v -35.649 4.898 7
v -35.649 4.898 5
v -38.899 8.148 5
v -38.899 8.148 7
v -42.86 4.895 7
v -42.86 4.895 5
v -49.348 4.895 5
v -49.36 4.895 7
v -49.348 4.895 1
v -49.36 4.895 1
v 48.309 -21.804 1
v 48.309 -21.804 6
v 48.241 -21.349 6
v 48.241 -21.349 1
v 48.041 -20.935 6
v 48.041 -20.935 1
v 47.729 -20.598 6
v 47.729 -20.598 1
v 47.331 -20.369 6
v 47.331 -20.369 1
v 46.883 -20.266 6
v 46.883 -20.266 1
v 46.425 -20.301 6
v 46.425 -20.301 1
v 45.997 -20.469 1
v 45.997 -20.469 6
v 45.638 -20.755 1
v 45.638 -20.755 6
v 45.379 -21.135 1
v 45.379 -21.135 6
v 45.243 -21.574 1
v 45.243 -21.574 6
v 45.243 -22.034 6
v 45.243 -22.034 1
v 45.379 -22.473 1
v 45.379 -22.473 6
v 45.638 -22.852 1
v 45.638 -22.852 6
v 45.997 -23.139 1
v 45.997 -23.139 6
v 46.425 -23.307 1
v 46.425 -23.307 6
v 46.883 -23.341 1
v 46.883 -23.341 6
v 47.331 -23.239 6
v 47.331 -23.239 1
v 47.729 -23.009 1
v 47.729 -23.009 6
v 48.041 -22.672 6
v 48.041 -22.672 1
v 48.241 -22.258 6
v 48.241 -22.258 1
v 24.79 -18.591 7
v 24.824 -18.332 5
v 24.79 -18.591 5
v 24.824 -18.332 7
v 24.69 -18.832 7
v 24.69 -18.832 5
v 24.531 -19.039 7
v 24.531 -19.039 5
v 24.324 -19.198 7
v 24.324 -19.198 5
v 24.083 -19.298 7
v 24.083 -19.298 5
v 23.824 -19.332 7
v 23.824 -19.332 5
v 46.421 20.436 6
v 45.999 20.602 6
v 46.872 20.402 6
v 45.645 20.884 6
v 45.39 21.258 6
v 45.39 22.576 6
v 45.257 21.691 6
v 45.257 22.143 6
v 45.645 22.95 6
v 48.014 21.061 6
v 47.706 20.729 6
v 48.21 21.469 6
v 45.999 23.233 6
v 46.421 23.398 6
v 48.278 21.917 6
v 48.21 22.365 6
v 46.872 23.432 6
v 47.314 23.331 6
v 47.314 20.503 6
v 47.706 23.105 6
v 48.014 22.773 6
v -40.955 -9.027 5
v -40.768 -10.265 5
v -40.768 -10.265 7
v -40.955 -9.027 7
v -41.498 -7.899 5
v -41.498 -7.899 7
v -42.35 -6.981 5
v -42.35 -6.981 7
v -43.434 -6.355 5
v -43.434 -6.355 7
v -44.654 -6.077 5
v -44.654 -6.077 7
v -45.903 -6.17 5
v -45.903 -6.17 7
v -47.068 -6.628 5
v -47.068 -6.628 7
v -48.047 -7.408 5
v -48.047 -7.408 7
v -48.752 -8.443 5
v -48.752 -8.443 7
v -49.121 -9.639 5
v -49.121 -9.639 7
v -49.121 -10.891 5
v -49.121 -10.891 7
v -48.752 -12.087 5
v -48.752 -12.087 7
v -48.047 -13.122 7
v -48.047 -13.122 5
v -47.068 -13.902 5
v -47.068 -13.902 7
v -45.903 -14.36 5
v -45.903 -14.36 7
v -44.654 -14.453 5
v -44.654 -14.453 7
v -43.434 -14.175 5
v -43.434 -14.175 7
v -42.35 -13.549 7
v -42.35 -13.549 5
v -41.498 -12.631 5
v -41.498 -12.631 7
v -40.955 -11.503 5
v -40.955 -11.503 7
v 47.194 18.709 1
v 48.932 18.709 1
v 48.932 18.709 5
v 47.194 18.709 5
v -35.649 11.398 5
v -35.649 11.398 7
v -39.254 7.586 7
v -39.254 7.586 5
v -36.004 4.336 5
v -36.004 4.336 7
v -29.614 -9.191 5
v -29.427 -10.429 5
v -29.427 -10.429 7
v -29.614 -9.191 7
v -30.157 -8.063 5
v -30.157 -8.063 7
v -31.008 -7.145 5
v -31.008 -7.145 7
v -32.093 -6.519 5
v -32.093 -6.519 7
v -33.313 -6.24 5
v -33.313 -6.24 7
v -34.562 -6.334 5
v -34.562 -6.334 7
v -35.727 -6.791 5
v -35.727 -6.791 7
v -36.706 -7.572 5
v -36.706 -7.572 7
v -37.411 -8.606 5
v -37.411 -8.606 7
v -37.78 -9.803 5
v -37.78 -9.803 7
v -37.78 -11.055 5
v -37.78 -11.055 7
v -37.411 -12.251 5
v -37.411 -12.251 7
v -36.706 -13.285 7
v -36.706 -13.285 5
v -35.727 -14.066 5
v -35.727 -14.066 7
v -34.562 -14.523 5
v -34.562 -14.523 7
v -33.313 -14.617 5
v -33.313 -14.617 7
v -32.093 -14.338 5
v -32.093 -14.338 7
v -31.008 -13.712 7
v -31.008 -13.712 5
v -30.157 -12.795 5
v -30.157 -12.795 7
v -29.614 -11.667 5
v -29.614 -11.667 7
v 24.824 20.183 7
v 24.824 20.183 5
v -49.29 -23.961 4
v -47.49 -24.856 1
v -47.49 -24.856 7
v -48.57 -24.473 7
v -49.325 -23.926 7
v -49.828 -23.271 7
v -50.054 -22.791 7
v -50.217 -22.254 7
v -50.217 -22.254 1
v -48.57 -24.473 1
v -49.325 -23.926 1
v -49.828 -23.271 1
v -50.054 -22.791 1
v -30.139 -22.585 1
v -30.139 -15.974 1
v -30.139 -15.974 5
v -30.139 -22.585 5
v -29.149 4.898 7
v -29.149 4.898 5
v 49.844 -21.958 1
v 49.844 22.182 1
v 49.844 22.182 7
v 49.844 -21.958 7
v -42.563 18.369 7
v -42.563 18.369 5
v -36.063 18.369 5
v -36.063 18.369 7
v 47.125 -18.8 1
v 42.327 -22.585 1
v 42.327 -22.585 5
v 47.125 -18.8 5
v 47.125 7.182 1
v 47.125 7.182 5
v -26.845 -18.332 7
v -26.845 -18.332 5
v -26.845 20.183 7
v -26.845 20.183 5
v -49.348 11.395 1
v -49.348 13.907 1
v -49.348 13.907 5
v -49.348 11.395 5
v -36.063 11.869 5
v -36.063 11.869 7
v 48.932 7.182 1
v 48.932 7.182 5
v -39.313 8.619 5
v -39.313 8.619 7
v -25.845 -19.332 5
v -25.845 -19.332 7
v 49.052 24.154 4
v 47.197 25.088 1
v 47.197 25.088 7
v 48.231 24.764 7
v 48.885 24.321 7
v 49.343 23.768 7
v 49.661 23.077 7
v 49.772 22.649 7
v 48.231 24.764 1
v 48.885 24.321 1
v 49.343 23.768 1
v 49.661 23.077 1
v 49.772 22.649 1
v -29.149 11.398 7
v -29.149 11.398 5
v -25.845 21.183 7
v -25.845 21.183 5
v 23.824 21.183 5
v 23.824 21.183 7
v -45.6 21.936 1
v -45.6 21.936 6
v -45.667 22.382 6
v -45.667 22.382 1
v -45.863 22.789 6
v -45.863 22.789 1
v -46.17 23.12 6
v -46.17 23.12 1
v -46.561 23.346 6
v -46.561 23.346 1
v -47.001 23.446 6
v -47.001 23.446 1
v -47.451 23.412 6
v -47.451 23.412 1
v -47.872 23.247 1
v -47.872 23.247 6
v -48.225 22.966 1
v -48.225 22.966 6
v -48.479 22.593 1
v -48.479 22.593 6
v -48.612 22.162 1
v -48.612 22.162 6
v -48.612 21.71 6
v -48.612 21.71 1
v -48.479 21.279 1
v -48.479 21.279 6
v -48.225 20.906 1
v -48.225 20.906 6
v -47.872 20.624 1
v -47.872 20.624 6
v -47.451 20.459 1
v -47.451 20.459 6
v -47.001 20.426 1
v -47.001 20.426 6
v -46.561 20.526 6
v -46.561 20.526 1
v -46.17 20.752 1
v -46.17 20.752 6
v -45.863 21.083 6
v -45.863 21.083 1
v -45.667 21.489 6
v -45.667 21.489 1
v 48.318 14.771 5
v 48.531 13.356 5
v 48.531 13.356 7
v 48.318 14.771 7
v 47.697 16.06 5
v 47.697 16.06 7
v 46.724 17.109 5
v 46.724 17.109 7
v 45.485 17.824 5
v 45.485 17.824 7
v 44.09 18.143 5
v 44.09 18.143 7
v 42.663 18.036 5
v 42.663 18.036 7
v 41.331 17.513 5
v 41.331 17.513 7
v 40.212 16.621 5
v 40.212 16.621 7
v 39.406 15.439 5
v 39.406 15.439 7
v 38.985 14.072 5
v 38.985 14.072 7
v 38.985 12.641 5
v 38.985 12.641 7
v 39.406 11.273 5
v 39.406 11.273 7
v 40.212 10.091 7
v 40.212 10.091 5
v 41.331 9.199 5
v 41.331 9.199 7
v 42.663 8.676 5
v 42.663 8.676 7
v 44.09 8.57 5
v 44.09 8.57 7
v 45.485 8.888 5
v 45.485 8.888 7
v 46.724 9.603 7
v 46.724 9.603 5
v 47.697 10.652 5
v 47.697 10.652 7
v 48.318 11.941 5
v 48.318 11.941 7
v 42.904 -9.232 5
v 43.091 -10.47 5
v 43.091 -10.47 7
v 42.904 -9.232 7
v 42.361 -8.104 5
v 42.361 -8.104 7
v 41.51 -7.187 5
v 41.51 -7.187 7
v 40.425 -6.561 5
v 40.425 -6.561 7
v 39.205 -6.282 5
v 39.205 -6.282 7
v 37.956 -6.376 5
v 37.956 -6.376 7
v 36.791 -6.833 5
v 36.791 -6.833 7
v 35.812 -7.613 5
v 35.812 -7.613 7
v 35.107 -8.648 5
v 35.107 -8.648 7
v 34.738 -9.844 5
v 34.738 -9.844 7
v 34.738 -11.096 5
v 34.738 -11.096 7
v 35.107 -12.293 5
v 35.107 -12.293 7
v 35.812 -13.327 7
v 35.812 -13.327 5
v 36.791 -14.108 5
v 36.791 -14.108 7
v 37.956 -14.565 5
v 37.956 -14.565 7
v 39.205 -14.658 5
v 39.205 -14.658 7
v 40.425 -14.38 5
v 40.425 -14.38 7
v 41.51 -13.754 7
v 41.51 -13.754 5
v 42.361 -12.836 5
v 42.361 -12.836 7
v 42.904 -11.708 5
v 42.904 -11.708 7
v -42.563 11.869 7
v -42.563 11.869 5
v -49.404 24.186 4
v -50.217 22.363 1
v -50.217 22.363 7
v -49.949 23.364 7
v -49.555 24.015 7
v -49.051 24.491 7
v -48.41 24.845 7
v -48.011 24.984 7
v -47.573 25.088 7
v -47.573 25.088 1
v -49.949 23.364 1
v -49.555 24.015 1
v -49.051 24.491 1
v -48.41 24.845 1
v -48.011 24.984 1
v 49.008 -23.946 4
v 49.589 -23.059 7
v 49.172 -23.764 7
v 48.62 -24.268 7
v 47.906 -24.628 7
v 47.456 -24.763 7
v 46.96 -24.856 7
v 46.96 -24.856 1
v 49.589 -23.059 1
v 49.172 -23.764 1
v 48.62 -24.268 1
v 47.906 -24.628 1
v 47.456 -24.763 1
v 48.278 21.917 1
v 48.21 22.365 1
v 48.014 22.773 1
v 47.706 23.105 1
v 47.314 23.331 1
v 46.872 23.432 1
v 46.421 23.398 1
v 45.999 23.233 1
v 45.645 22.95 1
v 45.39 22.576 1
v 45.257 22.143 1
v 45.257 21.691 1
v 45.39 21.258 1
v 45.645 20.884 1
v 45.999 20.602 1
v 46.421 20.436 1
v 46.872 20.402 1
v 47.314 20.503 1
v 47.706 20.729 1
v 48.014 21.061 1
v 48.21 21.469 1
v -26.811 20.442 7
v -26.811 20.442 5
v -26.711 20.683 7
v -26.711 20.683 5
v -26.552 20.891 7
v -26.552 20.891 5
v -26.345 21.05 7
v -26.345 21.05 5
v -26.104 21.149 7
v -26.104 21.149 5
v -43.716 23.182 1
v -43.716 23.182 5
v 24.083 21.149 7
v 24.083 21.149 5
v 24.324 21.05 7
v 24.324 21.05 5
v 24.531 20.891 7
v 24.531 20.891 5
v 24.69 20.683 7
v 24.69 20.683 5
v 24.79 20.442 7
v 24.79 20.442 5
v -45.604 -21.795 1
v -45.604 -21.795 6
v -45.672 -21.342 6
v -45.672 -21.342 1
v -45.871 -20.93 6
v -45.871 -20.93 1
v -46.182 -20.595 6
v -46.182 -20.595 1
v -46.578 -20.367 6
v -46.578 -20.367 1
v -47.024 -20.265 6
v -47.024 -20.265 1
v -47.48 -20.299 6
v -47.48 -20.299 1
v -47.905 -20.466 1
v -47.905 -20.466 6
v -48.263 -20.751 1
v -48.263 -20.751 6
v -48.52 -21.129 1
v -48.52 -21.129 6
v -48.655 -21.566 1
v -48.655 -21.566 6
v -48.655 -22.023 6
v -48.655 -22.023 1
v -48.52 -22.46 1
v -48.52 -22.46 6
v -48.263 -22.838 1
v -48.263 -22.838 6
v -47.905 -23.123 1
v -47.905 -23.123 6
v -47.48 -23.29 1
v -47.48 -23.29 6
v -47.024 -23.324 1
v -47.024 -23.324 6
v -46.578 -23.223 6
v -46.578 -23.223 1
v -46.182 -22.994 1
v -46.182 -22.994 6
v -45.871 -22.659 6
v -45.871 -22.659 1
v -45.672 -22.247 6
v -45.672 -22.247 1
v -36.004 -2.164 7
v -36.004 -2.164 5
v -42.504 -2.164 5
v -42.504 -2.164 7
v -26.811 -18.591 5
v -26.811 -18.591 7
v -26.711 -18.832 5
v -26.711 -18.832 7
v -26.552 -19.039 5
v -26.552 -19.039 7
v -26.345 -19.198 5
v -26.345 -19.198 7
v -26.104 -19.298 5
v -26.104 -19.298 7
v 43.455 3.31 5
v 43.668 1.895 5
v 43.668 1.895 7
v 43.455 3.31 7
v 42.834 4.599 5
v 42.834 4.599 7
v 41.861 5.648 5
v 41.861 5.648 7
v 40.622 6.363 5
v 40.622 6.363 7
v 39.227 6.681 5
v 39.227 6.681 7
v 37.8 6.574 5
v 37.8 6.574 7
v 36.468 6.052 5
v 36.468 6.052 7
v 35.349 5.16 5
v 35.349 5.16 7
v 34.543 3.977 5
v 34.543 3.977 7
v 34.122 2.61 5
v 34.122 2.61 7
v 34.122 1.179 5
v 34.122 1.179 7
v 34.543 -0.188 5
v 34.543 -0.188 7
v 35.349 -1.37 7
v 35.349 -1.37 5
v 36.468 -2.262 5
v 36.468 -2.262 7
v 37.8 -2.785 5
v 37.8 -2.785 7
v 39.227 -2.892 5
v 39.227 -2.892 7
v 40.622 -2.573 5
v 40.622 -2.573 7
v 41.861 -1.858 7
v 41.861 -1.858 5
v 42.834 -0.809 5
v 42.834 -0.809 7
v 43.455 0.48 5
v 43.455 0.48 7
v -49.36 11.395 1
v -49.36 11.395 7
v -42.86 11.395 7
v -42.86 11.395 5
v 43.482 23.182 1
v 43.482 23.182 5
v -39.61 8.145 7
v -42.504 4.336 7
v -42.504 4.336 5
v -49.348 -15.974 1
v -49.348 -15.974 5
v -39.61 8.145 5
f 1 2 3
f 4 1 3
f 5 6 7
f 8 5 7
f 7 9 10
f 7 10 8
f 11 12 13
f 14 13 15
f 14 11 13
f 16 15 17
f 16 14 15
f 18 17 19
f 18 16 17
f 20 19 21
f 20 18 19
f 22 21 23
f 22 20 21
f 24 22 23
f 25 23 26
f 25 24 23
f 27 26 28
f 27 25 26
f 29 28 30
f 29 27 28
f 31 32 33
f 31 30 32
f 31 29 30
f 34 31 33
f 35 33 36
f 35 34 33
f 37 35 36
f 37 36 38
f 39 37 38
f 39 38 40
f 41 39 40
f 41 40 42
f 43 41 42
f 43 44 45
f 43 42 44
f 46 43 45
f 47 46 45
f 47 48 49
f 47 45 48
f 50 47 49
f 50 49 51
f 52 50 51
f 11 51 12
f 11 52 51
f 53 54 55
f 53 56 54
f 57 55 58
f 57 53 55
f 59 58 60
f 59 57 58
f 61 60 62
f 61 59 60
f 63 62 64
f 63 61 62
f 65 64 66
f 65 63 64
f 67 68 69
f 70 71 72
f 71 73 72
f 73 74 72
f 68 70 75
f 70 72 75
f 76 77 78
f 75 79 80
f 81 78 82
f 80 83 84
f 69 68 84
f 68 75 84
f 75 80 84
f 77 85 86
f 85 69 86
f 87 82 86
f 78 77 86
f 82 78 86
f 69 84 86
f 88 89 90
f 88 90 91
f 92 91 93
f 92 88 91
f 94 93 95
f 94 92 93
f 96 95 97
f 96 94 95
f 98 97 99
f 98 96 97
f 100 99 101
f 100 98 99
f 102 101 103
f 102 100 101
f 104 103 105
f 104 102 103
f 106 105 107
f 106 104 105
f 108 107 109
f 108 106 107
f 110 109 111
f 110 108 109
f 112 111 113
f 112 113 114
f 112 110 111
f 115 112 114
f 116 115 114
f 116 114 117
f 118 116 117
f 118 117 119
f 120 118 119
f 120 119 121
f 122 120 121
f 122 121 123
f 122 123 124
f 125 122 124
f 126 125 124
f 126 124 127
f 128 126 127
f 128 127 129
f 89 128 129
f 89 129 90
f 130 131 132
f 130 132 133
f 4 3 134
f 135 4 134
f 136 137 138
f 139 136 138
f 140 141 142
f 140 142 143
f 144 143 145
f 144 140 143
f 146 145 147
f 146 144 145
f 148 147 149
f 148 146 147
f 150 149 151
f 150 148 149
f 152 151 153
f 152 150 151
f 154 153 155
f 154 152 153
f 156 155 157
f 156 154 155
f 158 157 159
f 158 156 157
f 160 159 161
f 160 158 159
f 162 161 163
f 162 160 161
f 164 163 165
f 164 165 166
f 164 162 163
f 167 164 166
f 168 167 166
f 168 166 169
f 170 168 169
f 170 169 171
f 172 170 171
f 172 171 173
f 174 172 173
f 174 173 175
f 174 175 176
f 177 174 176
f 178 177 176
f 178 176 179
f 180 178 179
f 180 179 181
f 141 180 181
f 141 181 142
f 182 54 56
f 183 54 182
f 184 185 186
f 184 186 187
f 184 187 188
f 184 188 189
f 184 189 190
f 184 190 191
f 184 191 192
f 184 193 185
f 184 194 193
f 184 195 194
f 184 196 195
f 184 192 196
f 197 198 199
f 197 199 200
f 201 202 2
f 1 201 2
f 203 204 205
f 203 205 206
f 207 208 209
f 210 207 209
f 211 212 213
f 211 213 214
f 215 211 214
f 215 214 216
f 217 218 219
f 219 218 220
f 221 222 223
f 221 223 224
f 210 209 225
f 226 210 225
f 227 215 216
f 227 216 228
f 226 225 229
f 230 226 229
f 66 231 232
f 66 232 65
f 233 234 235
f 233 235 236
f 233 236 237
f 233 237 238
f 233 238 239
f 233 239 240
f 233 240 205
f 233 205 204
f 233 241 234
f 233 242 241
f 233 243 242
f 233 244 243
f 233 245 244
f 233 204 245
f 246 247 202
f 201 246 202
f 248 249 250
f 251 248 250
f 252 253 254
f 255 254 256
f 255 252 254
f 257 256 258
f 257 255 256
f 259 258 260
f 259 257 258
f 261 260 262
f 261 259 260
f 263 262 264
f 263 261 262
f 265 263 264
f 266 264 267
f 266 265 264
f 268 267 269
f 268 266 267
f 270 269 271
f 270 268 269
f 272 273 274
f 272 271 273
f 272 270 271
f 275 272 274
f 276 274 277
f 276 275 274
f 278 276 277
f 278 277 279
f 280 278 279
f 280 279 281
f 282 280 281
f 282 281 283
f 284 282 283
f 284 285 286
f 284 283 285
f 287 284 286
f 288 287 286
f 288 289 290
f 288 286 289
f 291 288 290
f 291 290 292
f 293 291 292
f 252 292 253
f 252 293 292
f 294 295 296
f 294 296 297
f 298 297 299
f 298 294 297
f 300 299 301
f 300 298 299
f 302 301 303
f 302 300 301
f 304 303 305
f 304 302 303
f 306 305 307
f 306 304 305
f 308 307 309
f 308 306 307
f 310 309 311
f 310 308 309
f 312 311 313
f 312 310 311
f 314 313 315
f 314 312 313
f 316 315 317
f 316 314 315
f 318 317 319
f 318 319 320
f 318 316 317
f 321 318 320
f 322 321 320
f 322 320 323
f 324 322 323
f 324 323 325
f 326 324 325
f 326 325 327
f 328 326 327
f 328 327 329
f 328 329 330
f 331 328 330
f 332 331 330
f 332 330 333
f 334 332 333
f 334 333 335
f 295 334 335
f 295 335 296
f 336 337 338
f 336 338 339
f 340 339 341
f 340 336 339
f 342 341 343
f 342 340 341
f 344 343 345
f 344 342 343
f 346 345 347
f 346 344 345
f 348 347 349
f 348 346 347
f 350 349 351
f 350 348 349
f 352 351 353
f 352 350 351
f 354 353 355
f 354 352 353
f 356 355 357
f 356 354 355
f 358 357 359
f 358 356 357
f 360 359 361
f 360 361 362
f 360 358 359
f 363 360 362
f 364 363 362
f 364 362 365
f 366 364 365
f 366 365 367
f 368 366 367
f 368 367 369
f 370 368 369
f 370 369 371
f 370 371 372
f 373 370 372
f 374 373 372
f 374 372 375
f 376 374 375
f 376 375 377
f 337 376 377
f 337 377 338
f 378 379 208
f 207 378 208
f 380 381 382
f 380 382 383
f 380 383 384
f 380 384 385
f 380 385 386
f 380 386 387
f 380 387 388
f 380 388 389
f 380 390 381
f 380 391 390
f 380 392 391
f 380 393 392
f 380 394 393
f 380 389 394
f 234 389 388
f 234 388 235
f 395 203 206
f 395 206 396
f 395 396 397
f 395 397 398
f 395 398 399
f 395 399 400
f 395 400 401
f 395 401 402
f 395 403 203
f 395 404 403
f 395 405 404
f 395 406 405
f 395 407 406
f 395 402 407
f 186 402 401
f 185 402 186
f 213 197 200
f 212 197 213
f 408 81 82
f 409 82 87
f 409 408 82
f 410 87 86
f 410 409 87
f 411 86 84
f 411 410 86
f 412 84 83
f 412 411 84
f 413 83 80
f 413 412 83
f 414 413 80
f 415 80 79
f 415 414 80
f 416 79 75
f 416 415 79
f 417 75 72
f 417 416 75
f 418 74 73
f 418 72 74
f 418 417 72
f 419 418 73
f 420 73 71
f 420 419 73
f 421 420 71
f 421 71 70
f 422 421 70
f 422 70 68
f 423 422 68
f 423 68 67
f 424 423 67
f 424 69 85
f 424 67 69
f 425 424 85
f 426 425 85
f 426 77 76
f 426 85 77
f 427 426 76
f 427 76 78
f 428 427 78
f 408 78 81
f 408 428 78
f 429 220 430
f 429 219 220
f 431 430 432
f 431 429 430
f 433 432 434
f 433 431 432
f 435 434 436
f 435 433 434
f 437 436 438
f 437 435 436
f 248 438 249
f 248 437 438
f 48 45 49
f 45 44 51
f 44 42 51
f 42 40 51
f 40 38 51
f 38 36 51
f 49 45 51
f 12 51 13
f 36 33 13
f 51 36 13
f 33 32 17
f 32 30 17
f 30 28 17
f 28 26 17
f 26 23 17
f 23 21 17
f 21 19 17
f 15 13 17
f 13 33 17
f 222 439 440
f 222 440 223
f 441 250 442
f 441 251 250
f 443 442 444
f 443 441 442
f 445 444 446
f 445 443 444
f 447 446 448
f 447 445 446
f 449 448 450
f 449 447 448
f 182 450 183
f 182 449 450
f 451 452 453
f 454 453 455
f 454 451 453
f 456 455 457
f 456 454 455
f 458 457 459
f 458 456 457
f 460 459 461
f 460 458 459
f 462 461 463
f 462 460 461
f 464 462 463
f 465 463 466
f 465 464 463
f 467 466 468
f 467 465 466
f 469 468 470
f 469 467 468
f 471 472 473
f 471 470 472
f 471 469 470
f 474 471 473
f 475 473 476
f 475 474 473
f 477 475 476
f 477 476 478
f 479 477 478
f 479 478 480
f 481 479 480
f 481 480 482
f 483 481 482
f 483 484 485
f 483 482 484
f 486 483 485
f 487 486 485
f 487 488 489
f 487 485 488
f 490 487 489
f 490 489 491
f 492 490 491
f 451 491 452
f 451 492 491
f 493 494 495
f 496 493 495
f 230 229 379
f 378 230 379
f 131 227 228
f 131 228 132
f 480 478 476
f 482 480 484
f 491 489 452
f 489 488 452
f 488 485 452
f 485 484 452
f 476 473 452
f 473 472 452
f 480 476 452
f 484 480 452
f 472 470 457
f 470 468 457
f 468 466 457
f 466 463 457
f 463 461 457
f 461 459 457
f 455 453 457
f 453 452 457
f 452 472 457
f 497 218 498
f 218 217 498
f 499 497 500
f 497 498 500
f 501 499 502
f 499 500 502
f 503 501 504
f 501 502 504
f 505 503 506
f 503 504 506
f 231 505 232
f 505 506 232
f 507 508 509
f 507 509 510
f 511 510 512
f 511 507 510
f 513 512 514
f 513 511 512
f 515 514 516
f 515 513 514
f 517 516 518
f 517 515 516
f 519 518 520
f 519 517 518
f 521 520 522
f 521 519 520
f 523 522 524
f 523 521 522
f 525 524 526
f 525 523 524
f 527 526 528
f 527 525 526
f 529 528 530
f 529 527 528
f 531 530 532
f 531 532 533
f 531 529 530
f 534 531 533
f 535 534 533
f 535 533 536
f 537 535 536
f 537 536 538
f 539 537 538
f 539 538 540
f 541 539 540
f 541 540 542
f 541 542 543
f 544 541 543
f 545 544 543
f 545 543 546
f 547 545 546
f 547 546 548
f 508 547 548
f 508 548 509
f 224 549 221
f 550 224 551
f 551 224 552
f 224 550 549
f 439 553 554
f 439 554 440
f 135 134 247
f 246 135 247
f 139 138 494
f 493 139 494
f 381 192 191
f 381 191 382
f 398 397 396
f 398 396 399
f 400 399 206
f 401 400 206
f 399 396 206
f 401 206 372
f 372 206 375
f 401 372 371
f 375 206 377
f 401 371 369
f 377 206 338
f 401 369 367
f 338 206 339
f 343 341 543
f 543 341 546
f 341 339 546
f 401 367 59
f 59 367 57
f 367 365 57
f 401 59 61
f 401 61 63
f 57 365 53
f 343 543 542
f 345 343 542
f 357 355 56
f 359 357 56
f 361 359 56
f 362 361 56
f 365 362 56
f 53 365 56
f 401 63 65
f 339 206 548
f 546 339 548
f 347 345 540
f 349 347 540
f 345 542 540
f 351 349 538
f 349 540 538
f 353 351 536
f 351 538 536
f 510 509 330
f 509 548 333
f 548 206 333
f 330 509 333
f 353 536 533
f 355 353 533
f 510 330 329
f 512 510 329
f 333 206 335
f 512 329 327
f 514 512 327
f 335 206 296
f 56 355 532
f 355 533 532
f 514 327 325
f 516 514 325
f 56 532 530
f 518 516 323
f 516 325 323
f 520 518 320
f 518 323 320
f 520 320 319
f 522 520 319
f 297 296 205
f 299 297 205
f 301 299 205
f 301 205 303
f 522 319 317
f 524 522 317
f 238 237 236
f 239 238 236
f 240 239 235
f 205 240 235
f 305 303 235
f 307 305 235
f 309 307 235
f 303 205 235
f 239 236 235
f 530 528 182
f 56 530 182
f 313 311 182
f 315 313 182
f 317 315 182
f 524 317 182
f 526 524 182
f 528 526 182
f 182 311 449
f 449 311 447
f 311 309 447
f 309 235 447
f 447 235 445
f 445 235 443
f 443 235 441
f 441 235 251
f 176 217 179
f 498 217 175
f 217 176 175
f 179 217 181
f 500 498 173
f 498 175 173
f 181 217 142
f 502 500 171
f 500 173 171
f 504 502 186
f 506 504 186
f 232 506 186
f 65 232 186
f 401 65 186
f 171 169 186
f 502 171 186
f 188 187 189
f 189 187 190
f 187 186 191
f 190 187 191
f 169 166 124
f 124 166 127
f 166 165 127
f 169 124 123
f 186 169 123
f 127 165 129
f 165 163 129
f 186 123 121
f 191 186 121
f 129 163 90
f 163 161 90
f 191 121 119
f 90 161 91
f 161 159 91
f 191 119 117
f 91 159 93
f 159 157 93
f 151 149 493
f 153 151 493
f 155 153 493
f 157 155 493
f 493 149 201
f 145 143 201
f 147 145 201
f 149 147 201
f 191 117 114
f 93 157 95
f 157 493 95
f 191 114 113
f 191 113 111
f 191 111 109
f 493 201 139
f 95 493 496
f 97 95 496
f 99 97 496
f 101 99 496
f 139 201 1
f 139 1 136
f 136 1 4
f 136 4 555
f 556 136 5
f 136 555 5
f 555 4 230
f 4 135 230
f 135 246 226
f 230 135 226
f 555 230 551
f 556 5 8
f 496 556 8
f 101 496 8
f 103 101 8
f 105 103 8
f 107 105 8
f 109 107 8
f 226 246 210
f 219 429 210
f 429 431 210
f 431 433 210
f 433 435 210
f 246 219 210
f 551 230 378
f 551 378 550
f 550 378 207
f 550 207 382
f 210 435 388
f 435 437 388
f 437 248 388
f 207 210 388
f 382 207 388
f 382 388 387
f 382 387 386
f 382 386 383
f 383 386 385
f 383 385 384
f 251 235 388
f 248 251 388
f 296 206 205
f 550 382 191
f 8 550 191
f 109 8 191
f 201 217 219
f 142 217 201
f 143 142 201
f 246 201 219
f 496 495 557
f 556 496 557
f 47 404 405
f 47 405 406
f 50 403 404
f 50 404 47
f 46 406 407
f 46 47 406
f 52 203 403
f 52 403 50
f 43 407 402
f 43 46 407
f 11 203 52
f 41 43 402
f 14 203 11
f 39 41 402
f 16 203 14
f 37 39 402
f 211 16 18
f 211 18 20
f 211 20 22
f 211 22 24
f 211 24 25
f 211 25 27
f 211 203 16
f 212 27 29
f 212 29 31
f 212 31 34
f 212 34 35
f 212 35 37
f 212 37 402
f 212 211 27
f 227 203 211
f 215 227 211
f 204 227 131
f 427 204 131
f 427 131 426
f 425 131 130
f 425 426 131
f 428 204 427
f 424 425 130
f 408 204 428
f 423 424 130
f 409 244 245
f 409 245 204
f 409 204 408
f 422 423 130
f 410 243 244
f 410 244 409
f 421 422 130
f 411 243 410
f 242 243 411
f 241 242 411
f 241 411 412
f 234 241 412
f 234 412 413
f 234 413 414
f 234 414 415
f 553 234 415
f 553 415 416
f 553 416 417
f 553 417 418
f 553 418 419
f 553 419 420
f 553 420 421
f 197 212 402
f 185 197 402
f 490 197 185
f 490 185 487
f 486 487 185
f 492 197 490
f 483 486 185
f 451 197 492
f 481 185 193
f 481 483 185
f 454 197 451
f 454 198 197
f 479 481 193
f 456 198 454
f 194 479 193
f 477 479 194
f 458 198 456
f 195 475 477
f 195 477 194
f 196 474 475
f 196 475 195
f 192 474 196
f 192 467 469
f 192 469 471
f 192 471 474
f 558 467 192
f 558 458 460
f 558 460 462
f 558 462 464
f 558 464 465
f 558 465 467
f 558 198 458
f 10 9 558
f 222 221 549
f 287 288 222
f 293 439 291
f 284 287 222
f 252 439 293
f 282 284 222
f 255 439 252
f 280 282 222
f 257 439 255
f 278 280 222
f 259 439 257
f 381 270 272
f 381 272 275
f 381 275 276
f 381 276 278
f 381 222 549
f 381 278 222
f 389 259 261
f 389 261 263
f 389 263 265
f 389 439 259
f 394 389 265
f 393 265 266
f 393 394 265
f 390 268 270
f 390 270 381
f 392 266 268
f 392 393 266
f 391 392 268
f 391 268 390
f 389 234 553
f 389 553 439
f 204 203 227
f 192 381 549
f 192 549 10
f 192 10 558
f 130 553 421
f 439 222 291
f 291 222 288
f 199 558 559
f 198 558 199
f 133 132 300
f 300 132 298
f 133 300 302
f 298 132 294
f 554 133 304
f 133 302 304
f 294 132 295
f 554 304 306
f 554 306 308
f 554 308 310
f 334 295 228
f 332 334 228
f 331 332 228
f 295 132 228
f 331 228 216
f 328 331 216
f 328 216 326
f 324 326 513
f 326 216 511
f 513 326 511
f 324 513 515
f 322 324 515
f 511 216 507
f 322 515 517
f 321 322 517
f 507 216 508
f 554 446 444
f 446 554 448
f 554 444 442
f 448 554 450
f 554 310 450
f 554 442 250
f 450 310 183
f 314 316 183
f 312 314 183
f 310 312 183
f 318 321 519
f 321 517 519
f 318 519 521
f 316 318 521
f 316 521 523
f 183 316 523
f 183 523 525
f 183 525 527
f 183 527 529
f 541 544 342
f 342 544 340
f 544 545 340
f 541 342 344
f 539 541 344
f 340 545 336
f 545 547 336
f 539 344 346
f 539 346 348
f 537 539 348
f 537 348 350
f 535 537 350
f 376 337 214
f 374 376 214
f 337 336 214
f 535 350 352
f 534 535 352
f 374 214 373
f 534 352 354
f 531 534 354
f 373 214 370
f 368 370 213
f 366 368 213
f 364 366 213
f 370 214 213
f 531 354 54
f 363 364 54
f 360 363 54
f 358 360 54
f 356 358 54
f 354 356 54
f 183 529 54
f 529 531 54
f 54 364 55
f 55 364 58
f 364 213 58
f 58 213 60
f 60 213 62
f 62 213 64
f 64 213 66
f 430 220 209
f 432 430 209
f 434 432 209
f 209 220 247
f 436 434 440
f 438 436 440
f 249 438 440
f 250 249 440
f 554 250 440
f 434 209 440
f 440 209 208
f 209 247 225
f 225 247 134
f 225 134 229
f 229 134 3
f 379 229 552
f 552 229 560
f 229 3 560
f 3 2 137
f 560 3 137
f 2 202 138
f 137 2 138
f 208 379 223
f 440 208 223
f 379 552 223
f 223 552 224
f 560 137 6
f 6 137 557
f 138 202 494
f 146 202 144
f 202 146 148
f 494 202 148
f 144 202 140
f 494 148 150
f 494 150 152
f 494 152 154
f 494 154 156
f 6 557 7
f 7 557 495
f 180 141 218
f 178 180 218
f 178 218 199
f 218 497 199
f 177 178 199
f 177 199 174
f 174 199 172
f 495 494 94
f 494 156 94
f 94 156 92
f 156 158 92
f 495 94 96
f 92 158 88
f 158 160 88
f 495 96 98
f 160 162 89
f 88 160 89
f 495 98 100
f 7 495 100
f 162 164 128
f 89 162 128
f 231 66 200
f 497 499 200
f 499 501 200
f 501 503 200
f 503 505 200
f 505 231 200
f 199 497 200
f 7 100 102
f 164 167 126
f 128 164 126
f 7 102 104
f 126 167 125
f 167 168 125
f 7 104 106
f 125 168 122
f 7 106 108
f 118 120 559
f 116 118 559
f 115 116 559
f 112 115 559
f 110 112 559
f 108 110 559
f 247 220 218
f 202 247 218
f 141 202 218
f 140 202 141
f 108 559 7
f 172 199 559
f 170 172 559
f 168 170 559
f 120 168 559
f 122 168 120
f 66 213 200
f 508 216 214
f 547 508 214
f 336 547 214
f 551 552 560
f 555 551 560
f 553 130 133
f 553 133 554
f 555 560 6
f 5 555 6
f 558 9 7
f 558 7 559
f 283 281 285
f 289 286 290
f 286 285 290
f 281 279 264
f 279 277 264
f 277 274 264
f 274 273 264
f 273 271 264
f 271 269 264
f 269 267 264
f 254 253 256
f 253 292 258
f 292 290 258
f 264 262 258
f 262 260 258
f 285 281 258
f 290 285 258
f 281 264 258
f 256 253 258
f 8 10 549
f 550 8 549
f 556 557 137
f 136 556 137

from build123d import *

# Parameters (mm, degrees)
SKETCH004_R     = 4.2
SKETCH004_R_2   = 4.8
SKETCH004_R_3   = 1.518979
SKETCH004_R_4   = 1.54166
SKETCH004_R_5   = 1.514434
SKETCH004_R_6   = 1.53413
SKETCH004_W     = 51.669447
SKETCH004_H     = 40.515184
PAD004_DEPTH    = 6
POCKET_DEPTH    = 4
FILLET002_R     = 1
SKETCH006_R     = 1.977075
SKETCH006_R_2   = 1.924832
SKETCH006_R_3   = 1.937522
SKETCH006_R_4   = 2.033894
POCKET001_DEPTH = 1
SKETCH007_R     = 2.076166
SKETCH007_R_2   = 2.097374
SKETCH007_R_3   = 2.246485
SKETCH007_R_4   = 2.27026
PAD005_DEPTH    = 1


with BuildPart() as part:
    # Sketch004 → Pad004 (new body)
    with BuildSketch(Plane.XY):
        with BuildLine():
            Line((-47.572803, 25.088316), (47.196522, 25.088316))
            add(Edge.make_bspline(
                [(47.196522, 25.088316), (49.583878, 24.67317), (49.843609, 22.181658)],
                knots=[0, 0, 0, 1, 1, 1], degree=2))
            Line((49.843609, 22.181658), (49.843609, -21.958458))
            add(Edge.make_bspline(
                [(49.843609, -21.958458), (49.613785, -24.485321), (46.959763, -24.855799)],
                knots=[0, 0, 0, 1, 1, 1], degree=2))
            Line((46.959763, -24.855799), (-47.489712, -24.855799))
            add(Edge.make_bspline(
                [(-47.489712, -24.855799), (-49.726002, -24.366434), (-50.217018, -22.253706)],
                knots=[0, 0, 0, 1, 1, 1], degree=2))
            Line((-50.217018, -22.253706), (-50.217018, 22.362692))
            add(Edge.make_bspline(
                [(-50.217018, 22.362692), (-49.912418, 24.645672), (-47.572803, 25.088316)],
                knots=[0, 0, 0, 1, 1, 1], degree=2))
        make_face()
        Polygon((-42.563313, 18.368522), (-36.063313, 18.368522), (-36.063313, 11.868522), (-39.313313, 8.618522), (-42.563313, 11.868522), align=None, mode=Mode.SUBTRACT)
        Polygon((-38.898651, 8.147736), (-35.648651, 11.397736), (-29.148651, 11.397736), (-29.148651, 4.897736), (-35.648651, 4.897736), align=None, mode=Mode.SUBTRACT)
        Polygon((-39.254463, 7.585952), (-36.004463, 4.335952), (-36.004463, -2.164048), (-42.504463, -2.164048), (-42.504463, 4.335952), align=None, mode=Mode.SUBTRACT)
        Polygon((-39.610279, 8.14501), (-42.860279, 4.89501), (-49.360279, 4.89501), (-49.360279, 11.39501), (-42.860279, 11.39501), align=None, mode=Mode.SUBTRACT)
        with Locations((-44.968281, -10.264997)):
            Circle(SKETCH004_R, mode=Mode.SUBTRACT)
        with Locations((-33.627011, -10.428595)):
            Circle(SKETCH004_R, mode=Mode.SUBTRACT)
        with Locations((43.730999, 13.356121)):
            Circle(SKETCH004_R_2, mode=Mode.SUBTRACT)
        with Locations((38.86813, 1.894801)):
            Circle(SKETCH004_R_2, mode=Mode.SUBTRACT)
        with Locations((38.891018, -10.470211)):
            Circle(SKETCH004_R, mode=Mode.SUBTRACT)
        with Locations((46.758968, 21.917048)):
            Circle(SKETCH004_R_3, mode=Mode.SUBTRACT)
        with Locations((46.767654, -21.803801)):
            Circle(SKETCH004_R_4, mode=Mode.SUBTRACT)
        with Locations((-47.11446, 21.935822)):
            Circle(SKETCH004_R_5, mode=Mode.SUBTRACT)
        with Locations((-47.138157, -21.794628)):
            Circle(SKETCH004_R_6, mode=Mode.SUBTRACT)
        with Locations((-1.010669, 0.925887)):
            Rectangle(SKETCH004_W, SKETCH004_H, mode=Mode.SUBTRACT)
    extrude(amount=PAD004_DEPTH)

    # Sketch005 (on Face42 of Pad004) → Pocket (cut)
    with BuildSketch(Plane(origin=(0, 0, 0), x_dir=(1, 0, 0), z_dir=(0, 0, -1))):
        Polygon((-49.347778, 15.974498), (-30.138617, 15.974498), (-30.138617, 22.584615), (42.326723, 22.584615), (47.125389, 18.800341), (47.125389, -7.181559), (48.931736, -7.181559), (48.931736, -18.709139), (47.194054, -18.709139), (43.481785, -23.182058), (-43.71611, -23.182058), (-49.347778, -13.90698), align=None)
    extrude(amount=-POCKET_DEPTH, mode=Mode.SUBTRACT)

    # Fillet002
    fillet002_edges = [part.edges().sort_by_distance(p)[0] for p in [
        (-26.845392, 21.183479, 5),
        (-26.845392, -19.331705, 5),
        (24.824055, -19.331705, 5),
        (24.824055, 21.183479, 5),
    ]]
    fillet(fillet002_edges, radius=FILLET002_R)

    # Sketch006 (on Face1 of Fillet002) → Pocket001 (cut)
    with BuildSketch(Plane.XY.offset(6)):
        with Locations((-47.123535, 21.901525)):
            Circle(SKETCH006_R)
        with Locations((46.745956, 21.922697)):
            Circle(SKETCH006_R_2)
        with Locations((46.77578, -21.811125)):
            Circle(SKETCH006_R_3)
        with Locations((-47.121822, -21.801273)):
            Circle(SKETCH006_R_4)
    extrude(amount=-POCKET001_DEPTH, mode=Mode.SUBTRACT)

    # Sketch007 (on Face50 of Pocket001) → Pad005 (join)
    with BuildSketch(Plane.XY.offset(5)):
        with Locations((46.794399, -21.825701)):
            Circle(SKETCH007_R)
        with Locations((46.828327, 21.859865)):
            Circle(SKETCH007_R_2)
        with Locations((-47.145874, 21.87035)):
            Circle(SKETCH007_R_3)
        with Locations((-47.14336, -21.791445)):
            Circle(SKETCH007_R_4)
    extrude(amount=PAD005_DEPTH)


with BuildPart() as part_1:
    # Body001 placement: moved
    add(part.part.moved(Location((0, 0, 1))))


solid = part_1.part
